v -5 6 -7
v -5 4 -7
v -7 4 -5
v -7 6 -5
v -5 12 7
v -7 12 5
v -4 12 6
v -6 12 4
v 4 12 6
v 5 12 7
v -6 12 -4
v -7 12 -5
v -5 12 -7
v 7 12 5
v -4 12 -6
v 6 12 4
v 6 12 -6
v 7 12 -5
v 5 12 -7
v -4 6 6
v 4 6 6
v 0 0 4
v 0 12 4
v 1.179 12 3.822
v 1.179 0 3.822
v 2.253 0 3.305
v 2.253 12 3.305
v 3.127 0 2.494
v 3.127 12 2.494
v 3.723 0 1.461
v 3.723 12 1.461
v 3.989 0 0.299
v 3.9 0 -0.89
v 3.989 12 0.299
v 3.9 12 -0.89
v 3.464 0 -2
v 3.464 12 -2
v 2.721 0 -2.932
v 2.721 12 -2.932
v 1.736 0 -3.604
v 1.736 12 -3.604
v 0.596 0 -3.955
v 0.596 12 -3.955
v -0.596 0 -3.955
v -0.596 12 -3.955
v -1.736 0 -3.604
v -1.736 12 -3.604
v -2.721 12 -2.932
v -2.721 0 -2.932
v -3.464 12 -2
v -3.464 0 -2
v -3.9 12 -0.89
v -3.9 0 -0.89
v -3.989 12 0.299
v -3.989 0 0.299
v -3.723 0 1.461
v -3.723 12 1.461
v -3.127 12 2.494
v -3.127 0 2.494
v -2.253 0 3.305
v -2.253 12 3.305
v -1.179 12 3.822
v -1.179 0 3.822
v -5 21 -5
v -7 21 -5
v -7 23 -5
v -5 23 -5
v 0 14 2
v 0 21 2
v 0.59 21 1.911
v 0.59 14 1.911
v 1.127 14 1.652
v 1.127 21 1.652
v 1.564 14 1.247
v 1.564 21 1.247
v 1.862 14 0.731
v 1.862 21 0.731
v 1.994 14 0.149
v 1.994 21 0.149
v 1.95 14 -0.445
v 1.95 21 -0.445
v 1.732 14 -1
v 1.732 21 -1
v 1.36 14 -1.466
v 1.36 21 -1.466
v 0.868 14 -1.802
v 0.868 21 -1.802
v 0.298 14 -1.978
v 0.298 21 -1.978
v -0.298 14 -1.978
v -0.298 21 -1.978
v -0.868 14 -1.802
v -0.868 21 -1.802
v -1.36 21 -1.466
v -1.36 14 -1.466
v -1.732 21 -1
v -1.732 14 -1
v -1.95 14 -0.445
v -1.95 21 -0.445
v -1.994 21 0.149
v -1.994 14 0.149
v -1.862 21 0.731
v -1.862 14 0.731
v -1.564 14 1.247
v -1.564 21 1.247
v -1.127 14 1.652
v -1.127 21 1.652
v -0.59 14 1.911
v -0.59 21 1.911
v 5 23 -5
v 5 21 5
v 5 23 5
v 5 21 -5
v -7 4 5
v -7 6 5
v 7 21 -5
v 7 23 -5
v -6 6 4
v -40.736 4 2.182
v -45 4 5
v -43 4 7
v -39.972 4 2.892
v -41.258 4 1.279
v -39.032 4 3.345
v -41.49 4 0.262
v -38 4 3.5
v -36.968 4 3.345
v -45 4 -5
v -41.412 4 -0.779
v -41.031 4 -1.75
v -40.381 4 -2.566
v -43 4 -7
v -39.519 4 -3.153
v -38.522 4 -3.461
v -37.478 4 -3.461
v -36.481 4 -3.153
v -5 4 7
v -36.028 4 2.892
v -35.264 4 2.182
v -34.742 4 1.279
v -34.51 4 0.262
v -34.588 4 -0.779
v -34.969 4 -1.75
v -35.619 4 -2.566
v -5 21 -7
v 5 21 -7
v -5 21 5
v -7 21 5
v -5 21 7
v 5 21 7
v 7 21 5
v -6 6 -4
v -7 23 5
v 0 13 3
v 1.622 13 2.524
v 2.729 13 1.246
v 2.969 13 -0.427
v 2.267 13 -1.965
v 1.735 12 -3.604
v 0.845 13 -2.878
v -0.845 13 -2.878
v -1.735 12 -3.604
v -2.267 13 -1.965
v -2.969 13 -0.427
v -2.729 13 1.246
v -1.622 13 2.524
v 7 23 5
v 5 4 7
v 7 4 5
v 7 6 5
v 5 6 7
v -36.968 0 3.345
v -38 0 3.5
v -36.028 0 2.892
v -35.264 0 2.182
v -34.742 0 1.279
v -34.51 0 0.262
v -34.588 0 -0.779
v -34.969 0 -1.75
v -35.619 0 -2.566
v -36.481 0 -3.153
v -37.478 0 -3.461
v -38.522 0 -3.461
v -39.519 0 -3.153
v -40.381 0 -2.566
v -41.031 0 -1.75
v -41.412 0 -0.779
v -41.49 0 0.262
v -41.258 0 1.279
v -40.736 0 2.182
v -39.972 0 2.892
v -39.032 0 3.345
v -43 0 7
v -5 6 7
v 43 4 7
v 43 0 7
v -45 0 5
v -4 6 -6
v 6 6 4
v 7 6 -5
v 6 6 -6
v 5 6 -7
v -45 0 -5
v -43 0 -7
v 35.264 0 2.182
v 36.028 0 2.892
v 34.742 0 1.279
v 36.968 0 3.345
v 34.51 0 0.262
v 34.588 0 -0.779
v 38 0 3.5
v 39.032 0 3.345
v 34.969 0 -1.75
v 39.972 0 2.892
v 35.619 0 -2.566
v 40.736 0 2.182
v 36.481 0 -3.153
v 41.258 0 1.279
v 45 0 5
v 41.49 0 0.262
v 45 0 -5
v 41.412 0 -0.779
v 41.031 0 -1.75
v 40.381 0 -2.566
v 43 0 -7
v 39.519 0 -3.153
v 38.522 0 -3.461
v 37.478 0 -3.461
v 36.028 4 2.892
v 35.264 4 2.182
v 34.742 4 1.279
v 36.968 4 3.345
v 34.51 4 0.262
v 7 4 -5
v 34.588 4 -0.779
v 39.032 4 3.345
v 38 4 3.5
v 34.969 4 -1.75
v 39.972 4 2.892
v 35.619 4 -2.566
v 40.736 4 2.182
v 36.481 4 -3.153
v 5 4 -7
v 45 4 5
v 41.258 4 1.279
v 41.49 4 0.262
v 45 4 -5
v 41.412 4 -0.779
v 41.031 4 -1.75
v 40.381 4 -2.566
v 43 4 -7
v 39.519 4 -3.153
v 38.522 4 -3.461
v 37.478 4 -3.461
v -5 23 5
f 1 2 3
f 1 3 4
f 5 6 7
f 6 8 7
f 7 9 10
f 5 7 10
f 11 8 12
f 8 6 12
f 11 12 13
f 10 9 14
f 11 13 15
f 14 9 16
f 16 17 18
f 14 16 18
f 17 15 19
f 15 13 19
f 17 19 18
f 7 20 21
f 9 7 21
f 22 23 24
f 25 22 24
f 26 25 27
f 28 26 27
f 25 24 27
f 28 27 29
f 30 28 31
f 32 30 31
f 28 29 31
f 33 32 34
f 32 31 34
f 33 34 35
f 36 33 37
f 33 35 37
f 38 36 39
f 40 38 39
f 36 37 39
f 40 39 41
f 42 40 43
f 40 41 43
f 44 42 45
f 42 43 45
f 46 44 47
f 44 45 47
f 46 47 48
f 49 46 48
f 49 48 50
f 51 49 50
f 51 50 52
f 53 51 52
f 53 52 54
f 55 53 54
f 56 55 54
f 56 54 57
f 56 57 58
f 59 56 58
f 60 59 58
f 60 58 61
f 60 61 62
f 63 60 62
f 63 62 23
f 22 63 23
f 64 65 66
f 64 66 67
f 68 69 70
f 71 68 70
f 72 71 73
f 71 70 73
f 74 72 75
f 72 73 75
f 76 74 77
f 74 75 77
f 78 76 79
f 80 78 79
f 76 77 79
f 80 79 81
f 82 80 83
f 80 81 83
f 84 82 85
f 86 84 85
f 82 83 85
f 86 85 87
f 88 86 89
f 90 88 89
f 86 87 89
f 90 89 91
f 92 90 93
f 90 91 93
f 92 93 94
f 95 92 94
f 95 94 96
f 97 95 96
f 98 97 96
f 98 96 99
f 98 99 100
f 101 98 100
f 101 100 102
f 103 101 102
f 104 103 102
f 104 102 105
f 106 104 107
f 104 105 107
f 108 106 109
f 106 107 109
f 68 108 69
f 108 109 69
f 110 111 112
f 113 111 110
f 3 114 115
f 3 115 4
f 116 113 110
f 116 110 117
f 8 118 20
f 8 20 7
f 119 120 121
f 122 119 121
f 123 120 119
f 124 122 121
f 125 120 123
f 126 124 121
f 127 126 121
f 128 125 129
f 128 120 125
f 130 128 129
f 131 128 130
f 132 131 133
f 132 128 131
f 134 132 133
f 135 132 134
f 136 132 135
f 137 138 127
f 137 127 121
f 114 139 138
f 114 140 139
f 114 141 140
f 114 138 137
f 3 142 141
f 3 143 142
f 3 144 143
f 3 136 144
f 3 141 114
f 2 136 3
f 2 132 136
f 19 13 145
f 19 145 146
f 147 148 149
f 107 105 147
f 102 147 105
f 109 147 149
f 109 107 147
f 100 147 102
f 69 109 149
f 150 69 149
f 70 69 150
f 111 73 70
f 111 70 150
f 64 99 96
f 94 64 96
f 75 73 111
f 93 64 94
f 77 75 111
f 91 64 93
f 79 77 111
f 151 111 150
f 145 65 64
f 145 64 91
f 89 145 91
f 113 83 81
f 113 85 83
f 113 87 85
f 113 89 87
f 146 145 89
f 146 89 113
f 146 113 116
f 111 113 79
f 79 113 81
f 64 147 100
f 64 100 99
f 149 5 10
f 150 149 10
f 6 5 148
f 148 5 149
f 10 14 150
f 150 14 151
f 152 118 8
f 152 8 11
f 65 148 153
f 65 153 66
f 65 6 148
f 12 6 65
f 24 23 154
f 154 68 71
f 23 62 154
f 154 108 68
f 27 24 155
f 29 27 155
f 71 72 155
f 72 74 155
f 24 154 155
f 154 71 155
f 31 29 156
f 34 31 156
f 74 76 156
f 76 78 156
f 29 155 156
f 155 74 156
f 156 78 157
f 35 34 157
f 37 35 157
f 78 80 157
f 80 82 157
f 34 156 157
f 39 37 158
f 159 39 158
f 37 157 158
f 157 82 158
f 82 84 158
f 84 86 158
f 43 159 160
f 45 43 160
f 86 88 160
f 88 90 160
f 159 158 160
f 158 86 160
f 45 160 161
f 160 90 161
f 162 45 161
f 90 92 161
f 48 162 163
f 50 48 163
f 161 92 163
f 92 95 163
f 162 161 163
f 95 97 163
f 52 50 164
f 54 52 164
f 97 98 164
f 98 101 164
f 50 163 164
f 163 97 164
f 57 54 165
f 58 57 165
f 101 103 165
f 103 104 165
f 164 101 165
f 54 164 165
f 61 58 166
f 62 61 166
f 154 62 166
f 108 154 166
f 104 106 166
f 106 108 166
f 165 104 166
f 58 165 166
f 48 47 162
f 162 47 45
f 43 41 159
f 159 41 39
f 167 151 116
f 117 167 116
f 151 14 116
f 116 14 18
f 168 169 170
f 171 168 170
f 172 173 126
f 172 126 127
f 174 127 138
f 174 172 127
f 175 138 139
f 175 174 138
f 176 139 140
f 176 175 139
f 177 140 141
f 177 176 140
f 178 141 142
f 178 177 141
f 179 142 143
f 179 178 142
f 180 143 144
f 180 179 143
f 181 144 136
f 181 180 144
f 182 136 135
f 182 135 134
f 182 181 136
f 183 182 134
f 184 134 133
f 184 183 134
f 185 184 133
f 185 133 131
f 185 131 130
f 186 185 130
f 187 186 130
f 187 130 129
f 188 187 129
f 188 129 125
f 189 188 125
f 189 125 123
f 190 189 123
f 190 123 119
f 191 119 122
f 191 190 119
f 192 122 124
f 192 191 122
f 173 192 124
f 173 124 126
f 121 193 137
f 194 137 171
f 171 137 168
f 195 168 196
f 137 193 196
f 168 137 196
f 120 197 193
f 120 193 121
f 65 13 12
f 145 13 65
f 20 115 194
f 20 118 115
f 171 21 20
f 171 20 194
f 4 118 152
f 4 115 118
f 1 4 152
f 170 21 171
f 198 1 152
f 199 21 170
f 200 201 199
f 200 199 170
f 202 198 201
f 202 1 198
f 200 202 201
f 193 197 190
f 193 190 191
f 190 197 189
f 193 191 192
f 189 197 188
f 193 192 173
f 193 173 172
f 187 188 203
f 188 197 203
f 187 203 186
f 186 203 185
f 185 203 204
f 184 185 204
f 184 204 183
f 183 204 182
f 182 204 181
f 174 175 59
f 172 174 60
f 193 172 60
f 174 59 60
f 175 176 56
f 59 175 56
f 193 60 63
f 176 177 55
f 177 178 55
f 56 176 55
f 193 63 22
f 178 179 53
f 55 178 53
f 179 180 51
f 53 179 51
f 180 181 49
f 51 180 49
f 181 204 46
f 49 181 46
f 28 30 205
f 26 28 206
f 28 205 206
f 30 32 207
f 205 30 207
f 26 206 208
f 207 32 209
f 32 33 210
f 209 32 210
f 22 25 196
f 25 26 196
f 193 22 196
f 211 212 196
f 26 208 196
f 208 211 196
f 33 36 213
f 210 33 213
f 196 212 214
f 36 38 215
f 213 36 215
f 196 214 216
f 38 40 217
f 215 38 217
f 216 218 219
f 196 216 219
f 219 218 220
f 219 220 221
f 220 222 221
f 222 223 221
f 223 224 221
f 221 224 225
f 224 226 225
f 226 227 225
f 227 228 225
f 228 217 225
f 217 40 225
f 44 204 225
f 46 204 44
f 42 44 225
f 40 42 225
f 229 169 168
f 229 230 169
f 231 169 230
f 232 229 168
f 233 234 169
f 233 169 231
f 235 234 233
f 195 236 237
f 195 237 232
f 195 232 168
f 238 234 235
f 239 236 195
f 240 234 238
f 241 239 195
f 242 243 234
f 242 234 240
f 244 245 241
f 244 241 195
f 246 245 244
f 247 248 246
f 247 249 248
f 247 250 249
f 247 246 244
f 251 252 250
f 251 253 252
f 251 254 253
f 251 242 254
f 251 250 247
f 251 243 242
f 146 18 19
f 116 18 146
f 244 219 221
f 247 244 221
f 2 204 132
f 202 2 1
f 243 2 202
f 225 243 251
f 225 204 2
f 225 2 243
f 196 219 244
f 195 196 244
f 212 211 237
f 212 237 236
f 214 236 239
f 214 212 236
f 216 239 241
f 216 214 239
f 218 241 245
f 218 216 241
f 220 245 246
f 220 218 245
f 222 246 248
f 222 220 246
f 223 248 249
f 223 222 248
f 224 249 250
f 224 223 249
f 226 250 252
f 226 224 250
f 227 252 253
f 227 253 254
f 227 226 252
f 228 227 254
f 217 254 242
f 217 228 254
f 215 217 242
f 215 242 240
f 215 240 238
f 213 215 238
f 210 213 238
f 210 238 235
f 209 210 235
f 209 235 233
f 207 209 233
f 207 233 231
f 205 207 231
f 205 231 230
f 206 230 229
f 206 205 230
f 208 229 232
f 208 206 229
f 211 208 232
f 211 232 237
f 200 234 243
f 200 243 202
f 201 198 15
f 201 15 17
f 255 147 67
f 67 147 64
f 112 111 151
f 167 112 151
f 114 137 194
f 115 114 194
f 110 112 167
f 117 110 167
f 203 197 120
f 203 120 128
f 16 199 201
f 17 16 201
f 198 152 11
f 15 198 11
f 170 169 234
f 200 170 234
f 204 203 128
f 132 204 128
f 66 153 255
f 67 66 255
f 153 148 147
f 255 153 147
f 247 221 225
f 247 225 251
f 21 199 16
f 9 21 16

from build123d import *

# Parameters (mm, degrees)
SKETCH1_W           = 90
SKETCH1_H           = 14
SKETCH1_R           = 2
SKETCH1_R_2         = 3.5
BOSS_EXTRUDE1_DEPTH = 4
SKETCH2_W           = 14
SKETCH2_H           = 14
BOSS_EXTRUDE2_DEPTH = 2
SKETCH3_W           = 12
SKETCH3_H           = 12
BOSS_EXTRUDE3_DEPTH = 6
SKETCH4_W           = 14
SKETCH4_H           = 14
BOSS_EXTRUDE4_DEPTH = 9
SKETCH5_W           = 2
SKETCH5_H           = 10
BOSS_EXTRUDE5_DEPTH = 2
SKETCH6_R           = 2
CUT_EXTRUDE1_DEPTH  = 9
SKETCH8_R           = 4
SKETCH8_R_2         = 2
CUT_EXTRUDE2_DEPTH  = 48.095647357
CHAMFER1_SIZE       = 2
CHAMFER2_SIZE       = 2


with BuildPart() as part:
    # Sketch1 → Boss-Extrude1 (new body)
    # profile 1 of 2: a face of its own
    with BuildSketch(Plane(origin=(0, 0, 0), x_dir=(1, 0, 0), z_dir=(0, 1, 0))):
        Rectangle(SKETCH1_W, SKETCH1_H)
        Circle(SKETCH1_R, mode=Mode.SUBTRACT)
        with Locations(Location((38, 0, 0), (0, 0, 270))):
            Circle(SKETCH1_R_2, mode=Mode.SUBTRACT)
        with Locations(Location((-38, 0, 0), (0, 0, 270))):
            Circle(SKETCH1_R_2, mode=Mode.SUBTRACT)
    # profile 2 of 2: a face of its own
    with BuildSketch(Plane(origin=(0, 0, 0), x_dir=(1, 0, 0), z_dir=(0, 1, 0))):
        Circle(SKETCH1_R)
    extrude(amount=BOSS_EXTRUDE1_DEPTH)

    # Sketch2 → Boss-Extrude2 (add)
    with BuildSketch(Plane(origin=(0, 4, 0), x_dir=(1, 0, 0), z_dir=(0, 1, 0))):
        Rectangle(SKETCH2_W, SKETCH2_H)
    extrude(amount=BOSS_EXTRUDE2_DEPTH)

    # Sketch3 → Boss-Extrude3 (add)
    with BuildSketch(Plane(origin=(0, 6, 0), x_dir=(1, 0, 0), z_dir=(0, 1, 0))):
        Rectangle(SKETCH3_W, SKETCH3_H)
    extrude(amount=BOSS_EXTRUDE3_DEPTH)

    # Sketch4 → Boss-Extrude4 (add)
    with BuildSketch(Plane(origin=(0, 12, 0), x_dir=(1, 0, 0), z_dir=(0, 1, 0))):
        Rectangle(SKETCH4_W, SKETCH4_H)
    extrude(amount=BOSS_EXTRUDE4_DEPTH)

    # Sketch5 → Boss-Extrude5 (add)
    with BuildSketch(Plane(origin=(0, 21, 0), x_dir=(1, 0, 0), z_dir=(0, 1, 0))):
        with Locations((-6, 0)):
            Rectangle(SKETCH5_W, SKETCH5_H)
        with Locations((6, 0)):
            Rectangle(SKETCH5_W, SKETCH5_H)
    extrude(amount=BOSS_EXTRUDE5_DEPTH)

    # Sketch6 → Cut-Extrude1 (cut)
    with BuildSketch(Plane(origin=(0, 21, 0), x_dir=(1, 0, 0), z_dir=(0, 1, 0))):
        with Locations(Location((0, 0, 0), (0, 0, 270))):
            Circle(SKETCH6_R)
    extrude(amount=-CUT_EXTRUDE1_DEPTH, mode=Mode.SUBTRACT)

    # Sketch8 → Cut-Extrude2 (cut, through all)
    # profile 1 of 2: a face of its own
    with BuildSketch(Plane(origin=(0, 12, 0), x_dir=(1, 0, 0), z_dir=(0, 1, 0))):
        with Locations(Location((0, 0, 0), (0, 0, 270))):
            Circle(SKETCH8_R)
        with Locations(Location((0, 0, 0), (0, 0, 270))):
            Circle(SKETCH8_R_2, mode=Mode.SUBTRACT)
    # profile 2 of 2: a face of its own
    with BuildSketch(Plane(origin=(0, 12, 0), x_dir=(1, 0, 0), z_dir=(0, 1, 0))):
        with Locations(Location((0, 0, 0), (0, 0, 270))):
            Circle(SKETCH8_R_2)
    extrude(amount=-CUT_EXTRUDE2_DEPTH, mode=Mode.SUBTRACT)

    # Chamfer1
    chamfer1_edges = [part.edges().sort_by_distance(p)[0] for p in [
        (7, 5, 7),
        (6, 9, 6),
        (7, 16.5, 7),
        (7, 16.5, -7),
        (7, 5, -7),
        (-7, 5, 7),
        (-7, 5, -7),
        (-6, 9, -6),
        (-6, 9, 6),
        (-7, 16.5, 7),
        (45, 2, 7),
        (-45, 2, 7),
        (-45, 2, -7),
        (45, 2, -7),
        (-7, 16.5, -7),
    ]]
    chamfer(chamfer1_edges, length=CHAMFER1_SIZE - 0.0001)  # a hair under: the kernel refuses the full size

    # Chamfer2
    chamfer2_edges = [part.edges().sort_by_distance(p)[0] for p in [
        (0, 12, -2),
    ]]
    chamfer(chamfer2_edges, length=CHAMFER2_SIZE - 0.0001)  # a hair under: the kernel refuses the full size


solid = part.part
